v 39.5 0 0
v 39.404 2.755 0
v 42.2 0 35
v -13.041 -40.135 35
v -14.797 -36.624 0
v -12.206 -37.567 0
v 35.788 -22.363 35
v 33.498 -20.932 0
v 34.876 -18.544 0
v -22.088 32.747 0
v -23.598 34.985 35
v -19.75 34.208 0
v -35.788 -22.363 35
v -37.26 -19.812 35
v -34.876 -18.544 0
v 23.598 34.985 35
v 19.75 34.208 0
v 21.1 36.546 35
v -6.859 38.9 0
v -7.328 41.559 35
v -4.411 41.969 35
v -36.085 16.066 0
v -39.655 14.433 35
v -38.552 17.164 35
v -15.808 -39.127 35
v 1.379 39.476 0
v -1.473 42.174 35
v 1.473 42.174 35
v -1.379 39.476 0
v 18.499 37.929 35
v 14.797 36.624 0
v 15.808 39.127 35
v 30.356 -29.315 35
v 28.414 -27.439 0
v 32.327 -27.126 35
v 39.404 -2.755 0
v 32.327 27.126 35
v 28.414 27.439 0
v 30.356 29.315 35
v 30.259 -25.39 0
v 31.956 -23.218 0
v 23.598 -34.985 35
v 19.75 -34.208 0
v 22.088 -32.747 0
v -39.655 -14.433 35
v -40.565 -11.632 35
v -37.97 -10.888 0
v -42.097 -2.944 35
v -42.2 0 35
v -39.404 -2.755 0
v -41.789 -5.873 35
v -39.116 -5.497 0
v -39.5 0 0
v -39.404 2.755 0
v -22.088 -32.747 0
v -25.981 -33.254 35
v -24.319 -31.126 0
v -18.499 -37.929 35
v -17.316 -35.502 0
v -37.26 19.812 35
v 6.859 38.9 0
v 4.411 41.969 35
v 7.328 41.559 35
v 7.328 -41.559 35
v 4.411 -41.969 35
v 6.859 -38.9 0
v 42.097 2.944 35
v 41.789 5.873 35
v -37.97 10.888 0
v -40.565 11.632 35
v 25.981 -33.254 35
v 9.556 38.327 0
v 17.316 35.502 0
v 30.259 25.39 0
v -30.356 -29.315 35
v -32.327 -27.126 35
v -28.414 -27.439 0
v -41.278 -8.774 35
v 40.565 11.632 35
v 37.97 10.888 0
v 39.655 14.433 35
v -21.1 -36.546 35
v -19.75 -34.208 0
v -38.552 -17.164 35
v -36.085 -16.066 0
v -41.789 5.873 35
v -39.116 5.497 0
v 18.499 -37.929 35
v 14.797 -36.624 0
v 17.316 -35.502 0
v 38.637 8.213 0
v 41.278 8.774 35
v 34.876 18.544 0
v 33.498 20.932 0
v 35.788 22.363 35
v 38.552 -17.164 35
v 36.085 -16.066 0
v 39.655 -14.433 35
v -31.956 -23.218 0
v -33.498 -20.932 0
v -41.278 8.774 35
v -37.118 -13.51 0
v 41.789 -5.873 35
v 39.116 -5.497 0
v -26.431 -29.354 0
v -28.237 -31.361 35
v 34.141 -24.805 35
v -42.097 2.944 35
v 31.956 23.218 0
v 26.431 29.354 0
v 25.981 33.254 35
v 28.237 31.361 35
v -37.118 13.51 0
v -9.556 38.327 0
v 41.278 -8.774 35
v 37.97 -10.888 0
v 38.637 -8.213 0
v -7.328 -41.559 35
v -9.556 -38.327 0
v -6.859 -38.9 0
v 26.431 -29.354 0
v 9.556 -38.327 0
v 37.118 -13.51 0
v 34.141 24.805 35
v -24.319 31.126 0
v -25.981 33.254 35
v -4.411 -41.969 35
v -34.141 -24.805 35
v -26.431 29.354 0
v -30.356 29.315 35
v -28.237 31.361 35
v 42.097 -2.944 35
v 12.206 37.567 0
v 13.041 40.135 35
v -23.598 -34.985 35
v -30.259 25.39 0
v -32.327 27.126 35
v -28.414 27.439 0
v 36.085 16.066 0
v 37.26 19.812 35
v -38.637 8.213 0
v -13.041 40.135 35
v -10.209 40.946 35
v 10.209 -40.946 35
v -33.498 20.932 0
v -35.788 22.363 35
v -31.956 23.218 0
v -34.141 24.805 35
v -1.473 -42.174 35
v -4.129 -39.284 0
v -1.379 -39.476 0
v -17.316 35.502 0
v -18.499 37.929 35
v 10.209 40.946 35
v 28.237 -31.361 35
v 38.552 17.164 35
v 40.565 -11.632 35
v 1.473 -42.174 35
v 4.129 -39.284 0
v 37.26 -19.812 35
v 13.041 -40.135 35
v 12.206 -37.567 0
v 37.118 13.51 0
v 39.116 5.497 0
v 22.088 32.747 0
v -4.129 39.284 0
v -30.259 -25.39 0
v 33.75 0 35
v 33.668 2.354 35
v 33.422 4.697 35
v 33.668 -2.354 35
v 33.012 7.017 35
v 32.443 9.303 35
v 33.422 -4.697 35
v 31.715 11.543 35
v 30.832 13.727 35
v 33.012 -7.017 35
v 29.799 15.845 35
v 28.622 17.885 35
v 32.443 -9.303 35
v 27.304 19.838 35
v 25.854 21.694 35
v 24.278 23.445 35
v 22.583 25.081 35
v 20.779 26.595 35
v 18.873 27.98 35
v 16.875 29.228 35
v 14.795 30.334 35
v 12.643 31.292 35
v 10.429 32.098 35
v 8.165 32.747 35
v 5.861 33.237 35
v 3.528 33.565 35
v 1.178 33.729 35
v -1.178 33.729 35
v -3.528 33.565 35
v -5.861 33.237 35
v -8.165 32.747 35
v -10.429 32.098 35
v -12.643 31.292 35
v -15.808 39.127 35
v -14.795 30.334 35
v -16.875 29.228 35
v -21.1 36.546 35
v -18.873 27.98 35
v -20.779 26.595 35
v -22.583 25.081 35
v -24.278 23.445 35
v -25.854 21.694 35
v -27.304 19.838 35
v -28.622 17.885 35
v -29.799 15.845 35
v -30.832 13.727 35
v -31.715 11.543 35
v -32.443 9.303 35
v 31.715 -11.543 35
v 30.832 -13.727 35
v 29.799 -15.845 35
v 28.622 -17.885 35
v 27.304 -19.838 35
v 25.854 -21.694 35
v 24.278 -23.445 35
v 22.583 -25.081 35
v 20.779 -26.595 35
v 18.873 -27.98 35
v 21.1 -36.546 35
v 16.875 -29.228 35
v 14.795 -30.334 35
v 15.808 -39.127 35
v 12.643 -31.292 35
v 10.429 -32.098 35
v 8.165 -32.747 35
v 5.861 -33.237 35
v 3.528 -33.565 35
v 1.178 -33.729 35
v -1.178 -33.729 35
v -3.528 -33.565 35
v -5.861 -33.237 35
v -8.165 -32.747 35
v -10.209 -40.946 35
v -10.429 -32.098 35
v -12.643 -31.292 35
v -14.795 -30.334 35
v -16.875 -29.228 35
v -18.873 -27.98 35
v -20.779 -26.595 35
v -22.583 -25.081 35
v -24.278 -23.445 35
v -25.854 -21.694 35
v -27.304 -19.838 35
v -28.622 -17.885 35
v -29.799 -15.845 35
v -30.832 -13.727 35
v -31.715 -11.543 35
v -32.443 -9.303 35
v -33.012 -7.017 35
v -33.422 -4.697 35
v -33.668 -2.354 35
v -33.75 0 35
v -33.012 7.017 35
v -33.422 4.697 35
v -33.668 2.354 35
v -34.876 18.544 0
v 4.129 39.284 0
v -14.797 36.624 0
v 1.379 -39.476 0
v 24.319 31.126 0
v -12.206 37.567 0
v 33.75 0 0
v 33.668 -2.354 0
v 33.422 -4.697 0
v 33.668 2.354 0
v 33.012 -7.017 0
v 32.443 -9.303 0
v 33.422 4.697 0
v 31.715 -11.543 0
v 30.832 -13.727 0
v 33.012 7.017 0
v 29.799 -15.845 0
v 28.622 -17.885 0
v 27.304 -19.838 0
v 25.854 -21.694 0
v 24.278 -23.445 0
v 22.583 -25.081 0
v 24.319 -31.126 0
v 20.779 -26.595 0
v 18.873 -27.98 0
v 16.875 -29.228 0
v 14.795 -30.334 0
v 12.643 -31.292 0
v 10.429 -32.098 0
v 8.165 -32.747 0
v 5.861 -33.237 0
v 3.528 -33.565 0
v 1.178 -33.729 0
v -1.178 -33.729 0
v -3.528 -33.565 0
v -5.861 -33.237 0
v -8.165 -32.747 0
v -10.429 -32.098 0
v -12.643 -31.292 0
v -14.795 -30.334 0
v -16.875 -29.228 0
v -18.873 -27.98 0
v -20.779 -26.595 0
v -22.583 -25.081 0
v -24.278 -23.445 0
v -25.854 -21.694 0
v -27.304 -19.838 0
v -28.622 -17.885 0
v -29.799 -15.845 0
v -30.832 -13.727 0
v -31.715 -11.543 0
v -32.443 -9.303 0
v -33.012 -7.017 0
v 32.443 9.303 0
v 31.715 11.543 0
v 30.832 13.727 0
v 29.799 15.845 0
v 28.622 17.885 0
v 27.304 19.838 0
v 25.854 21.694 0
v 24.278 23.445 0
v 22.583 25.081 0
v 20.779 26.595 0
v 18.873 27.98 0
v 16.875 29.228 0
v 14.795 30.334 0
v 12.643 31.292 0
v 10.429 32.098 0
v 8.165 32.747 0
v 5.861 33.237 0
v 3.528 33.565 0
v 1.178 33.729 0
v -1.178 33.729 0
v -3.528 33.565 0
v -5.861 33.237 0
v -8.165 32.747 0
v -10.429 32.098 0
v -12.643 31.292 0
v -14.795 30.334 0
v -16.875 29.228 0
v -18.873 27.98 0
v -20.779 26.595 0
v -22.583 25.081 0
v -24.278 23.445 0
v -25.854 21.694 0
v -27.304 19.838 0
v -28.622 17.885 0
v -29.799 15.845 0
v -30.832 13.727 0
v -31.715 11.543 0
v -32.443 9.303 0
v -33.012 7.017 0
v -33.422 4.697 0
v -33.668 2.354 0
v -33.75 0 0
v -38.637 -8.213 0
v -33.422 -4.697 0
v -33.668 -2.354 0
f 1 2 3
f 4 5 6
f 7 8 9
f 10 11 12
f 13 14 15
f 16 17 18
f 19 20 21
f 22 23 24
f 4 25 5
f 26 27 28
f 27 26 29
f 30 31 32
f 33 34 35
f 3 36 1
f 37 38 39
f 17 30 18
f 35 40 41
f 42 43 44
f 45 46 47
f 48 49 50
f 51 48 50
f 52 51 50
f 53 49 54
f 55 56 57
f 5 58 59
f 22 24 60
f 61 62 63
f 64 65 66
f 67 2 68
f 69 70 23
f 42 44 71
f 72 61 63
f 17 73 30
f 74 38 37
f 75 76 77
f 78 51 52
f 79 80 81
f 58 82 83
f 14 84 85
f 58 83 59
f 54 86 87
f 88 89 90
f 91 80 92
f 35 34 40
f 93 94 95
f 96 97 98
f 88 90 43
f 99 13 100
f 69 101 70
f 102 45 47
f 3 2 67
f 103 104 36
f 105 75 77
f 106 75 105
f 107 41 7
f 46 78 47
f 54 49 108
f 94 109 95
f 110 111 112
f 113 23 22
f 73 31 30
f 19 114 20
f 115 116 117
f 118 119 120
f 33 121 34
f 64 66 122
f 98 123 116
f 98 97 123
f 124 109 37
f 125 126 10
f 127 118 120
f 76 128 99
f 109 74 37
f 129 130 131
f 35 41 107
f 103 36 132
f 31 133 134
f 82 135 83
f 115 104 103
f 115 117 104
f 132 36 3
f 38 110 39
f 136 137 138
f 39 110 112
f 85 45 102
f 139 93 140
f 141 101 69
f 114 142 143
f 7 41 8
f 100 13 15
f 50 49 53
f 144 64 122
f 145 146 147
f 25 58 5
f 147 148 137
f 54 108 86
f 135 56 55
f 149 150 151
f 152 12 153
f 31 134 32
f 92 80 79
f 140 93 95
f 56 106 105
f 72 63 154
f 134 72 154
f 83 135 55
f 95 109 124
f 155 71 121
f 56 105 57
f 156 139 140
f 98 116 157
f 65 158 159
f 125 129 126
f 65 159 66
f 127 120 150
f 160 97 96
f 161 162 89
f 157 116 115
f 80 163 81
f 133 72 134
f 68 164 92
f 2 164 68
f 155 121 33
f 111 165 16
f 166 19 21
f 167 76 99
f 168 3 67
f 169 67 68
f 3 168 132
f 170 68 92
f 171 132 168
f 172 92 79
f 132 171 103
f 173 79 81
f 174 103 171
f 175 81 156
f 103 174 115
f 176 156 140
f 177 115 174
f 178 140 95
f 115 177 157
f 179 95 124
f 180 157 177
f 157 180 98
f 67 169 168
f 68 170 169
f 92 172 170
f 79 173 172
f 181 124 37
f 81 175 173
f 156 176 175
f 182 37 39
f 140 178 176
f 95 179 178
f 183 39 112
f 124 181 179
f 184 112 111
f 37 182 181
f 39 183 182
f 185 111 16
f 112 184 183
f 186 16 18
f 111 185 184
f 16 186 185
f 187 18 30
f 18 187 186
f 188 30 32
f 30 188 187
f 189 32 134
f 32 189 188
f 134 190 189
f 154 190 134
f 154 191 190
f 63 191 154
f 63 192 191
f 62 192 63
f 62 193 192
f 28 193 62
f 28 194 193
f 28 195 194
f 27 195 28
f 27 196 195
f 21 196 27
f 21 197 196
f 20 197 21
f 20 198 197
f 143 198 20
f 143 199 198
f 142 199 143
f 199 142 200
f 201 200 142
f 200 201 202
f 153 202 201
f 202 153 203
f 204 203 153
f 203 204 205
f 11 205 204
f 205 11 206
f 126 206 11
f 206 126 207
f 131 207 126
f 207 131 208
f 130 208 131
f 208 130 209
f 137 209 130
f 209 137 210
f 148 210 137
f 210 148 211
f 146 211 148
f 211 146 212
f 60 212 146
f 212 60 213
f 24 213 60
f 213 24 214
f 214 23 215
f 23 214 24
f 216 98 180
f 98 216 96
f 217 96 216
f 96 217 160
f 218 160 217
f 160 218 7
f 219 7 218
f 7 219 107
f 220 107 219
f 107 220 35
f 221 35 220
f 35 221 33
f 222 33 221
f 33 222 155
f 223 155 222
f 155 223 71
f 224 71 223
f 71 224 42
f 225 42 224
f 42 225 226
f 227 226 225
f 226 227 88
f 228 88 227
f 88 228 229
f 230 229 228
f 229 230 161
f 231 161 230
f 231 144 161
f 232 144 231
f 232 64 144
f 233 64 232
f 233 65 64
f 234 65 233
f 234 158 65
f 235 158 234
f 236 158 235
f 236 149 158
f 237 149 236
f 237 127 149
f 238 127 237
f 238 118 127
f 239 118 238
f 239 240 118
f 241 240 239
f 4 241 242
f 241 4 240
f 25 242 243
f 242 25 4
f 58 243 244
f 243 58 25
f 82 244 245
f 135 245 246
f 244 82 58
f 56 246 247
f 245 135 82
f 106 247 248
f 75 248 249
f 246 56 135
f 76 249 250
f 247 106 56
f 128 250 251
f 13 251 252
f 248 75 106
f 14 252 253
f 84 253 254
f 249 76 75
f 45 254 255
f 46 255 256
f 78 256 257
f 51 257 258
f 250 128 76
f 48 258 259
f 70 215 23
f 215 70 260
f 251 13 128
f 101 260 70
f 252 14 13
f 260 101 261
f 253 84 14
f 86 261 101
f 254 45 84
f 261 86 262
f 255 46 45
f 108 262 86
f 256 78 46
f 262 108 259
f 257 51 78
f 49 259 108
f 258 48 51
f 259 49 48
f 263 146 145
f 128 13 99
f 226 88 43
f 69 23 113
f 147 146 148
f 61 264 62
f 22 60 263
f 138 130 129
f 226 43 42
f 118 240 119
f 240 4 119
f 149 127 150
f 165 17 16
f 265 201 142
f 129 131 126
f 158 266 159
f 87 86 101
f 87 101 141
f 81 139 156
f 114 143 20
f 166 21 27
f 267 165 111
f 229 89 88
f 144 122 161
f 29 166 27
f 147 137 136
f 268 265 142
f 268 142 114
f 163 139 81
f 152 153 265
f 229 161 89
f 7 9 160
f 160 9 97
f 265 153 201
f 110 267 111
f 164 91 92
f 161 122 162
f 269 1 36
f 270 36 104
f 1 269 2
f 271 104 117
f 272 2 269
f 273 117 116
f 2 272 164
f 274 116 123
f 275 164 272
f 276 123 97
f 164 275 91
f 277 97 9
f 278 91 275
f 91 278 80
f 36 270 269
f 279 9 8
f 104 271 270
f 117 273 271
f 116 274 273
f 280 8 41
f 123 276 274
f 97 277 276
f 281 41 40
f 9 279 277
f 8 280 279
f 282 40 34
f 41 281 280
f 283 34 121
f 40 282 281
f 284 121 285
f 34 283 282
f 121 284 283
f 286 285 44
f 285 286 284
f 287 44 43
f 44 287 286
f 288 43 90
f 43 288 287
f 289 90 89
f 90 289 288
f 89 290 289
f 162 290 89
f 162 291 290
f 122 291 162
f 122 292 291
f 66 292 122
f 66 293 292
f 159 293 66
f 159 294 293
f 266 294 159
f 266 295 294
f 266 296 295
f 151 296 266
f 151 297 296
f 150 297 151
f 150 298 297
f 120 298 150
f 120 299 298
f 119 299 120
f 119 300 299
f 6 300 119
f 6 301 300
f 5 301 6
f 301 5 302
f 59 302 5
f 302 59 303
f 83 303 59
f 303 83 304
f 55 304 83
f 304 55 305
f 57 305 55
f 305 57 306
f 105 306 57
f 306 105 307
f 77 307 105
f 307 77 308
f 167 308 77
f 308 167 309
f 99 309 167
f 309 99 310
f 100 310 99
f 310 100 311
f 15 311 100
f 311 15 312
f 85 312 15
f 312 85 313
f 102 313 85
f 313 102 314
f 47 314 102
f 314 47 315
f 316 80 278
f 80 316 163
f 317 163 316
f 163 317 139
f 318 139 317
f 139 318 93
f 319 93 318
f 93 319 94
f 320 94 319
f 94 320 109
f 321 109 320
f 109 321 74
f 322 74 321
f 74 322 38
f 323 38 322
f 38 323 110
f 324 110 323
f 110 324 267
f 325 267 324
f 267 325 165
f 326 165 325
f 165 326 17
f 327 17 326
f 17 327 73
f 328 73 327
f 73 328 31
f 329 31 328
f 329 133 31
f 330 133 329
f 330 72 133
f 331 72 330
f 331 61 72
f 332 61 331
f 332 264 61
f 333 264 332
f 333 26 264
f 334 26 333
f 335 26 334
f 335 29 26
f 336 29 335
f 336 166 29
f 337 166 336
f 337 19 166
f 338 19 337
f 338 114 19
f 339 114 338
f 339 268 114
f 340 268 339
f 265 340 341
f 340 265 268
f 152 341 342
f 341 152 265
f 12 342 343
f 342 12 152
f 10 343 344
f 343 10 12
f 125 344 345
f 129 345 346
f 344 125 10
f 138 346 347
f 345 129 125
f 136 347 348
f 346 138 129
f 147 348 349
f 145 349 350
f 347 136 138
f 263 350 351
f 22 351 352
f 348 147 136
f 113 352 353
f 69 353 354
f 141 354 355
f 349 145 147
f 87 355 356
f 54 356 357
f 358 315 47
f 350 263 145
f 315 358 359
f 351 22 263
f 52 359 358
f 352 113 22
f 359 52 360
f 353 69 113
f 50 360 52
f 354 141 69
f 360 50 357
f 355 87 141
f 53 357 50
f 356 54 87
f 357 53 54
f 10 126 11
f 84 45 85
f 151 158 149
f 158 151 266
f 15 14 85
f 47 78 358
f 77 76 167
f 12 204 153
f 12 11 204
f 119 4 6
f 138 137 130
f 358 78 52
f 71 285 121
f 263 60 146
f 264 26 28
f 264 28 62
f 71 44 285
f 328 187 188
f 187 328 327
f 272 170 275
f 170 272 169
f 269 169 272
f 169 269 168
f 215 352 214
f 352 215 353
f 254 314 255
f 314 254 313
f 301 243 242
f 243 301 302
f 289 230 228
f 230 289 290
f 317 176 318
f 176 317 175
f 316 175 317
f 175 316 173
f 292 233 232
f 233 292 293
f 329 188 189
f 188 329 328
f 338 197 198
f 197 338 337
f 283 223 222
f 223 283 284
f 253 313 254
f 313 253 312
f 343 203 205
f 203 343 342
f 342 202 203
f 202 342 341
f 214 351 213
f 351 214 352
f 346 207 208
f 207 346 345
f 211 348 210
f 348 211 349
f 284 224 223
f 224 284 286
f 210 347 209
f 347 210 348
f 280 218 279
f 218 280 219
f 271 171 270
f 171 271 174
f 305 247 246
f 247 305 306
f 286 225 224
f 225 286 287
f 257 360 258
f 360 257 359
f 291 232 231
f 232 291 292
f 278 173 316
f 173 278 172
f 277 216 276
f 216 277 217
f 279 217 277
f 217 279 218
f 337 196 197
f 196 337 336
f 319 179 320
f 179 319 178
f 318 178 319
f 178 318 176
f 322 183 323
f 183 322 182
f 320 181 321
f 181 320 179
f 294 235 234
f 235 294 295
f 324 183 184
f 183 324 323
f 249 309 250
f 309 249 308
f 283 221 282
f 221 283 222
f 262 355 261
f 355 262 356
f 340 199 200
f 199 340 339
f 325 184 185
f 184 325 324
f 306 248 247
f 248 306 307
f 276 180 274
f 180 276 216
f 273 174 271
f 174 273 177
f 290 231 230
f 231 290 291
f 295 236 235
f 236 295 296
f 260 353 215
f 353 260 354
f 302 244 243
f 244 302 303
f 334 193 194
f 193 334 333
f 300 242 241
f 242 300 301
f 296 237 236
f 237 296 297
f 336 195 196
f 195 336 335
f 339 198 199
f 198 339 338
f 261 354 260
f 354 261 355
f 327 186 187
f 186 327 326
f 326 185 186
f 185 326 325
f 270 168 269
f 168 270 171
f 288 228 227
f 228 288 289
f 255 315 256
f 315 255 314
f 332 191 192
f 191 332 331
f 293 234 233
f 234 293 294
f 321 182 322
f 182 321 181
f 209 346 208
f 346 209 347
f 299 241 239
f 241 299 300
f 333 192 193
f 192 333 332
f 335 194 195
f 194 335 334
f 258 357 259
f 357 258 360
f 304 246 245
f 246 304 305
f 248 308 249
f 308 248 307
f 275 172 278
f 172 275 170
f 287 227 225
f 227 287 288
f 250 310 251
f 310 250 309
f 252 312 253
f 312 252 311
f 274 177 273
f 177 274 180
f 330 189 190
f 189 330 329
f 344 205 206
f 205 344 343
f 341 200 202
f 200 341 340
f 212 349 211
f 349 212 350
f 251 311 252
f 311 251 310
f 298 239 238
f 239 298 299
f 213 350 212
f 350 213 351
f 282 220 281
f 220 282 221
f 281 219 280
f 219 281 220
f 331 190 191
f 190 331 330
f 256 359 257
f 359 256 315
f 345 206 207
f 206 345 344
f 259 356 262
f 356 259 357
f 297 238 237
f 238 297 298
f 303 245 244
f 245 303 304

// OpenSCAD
difference () {
  cylinder (h=35, d1=79, d2=84.4, $fn=90);
  cylinder (h=35, d=67.5, $fn=90);
};
